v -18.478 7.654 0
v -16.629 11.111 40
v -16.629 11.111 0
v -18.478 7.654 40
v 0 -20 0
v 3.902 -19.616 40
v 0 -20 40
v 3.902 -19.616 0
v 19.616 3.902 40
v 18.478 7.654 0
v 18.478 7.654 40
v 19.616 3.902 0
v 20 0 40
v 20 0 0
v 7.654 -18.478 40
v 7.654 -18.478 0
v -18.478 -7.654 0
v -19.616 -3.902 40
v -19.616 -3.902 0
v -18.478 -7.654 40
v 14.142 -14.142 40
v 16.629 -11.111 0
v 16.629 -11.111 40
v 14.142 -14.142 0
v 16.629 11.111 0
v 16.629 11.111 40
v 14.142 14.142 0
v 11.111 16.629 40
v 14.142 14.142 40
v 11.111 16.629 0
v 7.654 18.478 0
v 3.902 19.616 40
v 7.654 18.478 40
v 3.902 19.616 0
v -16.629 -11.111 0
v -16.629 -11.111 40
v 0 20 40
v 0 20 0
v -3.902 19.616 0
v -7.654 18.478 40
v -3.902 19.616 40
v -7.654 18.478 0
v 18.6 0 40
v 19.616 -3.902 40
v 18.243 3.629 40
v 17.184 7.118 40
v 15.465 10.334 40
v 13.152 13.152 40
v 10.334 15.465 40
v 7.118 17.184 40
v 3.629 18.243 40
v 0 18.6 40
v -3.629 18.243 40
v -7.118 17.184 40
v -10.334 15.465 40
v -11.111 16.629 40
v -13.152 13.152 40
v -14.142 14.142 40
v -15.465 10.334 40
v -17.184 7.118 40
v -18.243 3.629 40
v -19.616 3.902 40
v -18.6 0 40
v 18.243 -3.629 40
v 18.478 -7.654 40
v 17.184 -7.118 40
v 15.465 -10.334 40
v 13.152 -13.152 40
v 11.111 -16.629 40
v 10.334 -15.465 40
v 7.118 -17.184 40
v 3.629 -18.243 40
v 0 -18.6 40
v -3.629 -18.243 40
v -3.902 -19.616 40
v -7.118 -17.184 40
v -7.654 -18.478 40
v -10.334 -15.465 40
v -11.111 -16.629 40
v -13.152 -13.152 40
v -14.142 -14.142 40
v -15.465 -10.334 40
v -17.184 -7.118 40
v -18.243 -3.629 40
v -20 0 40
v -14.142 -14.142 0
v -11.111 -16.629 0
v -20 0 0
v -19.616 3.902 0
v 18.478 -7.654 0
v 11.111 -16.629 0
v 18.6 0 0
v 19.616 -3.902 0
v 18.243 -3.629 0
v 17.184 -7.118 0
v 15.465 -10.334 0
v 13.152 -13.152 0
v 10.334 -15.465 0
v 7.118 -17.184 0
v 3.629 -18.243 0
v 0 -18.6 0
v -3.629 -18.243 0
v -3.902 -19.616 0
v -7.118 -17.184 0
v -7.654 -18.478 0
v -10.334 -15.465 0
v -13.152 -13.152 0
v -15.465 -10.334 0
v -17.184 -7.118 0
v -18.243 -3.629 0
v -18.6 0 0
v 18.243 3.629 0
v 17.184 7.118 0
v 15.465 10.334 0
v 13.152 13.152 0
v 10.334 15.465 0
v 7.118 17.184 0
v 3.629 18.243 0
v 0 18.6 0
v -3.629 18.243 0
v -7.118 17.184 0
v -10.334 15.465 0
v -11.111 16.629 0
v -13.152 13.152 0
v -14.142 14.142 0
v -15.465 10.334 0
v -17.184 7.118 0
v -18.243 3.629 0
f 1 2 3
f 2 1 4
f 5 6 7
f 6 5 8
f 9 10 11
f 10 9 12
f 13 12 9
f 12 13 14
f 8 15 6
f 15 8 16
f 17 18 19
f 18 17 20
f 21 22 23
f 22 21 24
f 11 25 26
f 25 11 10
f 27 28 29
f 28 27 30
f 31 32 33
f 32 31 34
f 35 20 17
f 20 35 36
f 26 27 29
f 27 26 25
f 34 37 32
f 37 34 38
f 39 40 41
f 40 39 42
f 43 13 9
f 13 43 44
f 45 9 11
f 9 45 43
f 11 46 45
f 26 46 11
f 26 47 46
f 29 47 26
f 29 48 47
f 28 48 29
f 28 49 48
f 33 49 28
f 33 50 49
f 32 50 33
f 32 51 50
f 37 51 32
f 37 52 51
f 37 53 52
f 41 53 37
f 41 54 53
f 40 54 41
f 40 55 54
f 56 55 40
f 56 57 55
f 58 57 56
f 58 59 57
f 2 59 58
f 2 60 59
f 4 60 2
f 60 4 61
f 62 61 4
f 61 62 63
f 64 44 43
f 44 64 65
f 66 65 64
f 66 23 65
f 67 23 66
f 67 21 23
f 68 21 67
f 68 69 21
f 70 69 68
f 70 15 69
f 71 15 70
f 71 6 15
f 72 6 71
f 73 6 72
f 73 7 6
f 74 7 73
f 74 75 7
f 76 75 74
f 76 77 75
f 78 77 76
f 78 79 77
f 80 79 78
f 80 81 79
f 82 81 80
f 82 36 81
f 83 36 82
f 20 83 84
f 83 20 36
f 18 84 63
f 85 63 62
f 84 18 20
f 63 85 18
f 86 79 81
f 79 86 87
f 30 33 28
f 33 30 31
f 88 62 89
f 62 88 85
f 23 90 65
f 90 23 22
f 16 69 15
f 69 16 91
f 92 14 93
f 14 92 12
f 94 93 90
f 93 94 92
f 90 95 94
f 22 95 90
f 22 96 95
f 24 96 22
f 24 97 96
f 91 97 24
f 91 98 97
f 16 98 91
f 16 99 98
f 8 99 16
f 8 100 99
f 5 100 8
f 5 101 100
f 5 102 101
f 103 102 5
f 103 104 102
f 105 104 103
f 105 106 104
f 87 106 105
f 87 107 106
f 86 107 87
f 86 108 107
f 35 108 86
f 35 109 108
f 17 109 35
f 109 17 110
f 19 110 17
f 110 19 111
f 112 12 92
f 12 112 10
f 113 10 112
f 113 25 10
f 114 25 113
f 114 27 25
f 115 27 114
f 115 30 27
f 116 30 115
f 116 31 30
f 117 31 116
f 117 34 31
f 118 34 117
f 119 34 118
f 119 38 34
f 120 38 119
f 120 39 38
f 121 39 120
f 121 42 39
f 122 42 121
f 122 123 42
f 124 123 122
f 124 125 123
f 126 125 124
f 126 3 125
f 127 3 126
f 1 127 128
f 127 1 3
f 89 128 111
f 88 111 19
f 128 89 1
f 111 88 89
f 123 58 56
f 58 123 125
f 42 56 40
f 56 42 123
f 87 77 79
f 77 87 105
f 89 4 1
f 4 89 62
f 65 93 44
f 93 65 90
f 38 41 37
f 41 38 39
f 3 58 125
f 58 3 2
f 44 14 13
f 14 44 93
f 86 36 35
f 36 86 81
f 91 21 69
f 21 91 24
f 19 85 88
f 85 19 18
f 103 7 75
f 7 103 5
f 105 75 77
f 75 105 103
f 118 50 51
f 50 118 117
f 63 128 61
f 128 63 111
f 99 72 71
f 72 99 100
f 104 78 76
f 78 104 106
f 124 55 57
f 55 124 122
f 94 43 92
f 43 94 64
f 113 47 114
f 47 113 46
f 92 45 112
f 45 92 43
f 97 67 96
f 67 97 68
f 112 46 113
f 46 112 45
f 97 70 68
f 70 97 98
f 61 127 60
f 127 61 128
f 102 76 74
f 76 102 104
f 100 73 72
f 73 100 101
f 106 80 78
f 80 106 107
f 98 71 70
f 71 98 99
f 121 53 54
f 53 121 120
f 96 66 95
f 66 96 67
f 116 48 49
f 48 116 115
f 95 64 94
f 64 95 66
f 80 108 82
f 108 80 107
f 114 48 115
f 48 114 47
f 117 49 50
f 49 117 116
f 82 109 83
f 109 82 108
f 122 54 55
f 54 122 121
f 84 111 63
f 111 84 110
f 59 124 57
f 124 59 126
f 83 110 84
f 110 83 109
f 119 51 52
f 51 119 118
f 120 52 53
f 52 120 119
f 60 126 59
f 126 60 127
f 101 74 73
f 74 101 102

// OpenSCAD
$fn = 32;

// ----------------------------------------------------------------------
// Thin tube: 1.4 mm wall
// ----------------------------------------------------------------------

// --- parameters (mm) ---
tube_od = 40;             // outer diameter
tube_h = 40;              // height, Z
wall = 1.4;               // wall thickness
fit_tol = 0.05;           // tolerance for press fits, mm
free_tol = 0.2;           // tolerance for clearance fits, mm

difference() {
  cylinder(h = tube_h, d = tube_od);
  translate([0, 0, -1]) cylinder(h = tube_h + 2, d = tube_od - 2 * wall);
}
